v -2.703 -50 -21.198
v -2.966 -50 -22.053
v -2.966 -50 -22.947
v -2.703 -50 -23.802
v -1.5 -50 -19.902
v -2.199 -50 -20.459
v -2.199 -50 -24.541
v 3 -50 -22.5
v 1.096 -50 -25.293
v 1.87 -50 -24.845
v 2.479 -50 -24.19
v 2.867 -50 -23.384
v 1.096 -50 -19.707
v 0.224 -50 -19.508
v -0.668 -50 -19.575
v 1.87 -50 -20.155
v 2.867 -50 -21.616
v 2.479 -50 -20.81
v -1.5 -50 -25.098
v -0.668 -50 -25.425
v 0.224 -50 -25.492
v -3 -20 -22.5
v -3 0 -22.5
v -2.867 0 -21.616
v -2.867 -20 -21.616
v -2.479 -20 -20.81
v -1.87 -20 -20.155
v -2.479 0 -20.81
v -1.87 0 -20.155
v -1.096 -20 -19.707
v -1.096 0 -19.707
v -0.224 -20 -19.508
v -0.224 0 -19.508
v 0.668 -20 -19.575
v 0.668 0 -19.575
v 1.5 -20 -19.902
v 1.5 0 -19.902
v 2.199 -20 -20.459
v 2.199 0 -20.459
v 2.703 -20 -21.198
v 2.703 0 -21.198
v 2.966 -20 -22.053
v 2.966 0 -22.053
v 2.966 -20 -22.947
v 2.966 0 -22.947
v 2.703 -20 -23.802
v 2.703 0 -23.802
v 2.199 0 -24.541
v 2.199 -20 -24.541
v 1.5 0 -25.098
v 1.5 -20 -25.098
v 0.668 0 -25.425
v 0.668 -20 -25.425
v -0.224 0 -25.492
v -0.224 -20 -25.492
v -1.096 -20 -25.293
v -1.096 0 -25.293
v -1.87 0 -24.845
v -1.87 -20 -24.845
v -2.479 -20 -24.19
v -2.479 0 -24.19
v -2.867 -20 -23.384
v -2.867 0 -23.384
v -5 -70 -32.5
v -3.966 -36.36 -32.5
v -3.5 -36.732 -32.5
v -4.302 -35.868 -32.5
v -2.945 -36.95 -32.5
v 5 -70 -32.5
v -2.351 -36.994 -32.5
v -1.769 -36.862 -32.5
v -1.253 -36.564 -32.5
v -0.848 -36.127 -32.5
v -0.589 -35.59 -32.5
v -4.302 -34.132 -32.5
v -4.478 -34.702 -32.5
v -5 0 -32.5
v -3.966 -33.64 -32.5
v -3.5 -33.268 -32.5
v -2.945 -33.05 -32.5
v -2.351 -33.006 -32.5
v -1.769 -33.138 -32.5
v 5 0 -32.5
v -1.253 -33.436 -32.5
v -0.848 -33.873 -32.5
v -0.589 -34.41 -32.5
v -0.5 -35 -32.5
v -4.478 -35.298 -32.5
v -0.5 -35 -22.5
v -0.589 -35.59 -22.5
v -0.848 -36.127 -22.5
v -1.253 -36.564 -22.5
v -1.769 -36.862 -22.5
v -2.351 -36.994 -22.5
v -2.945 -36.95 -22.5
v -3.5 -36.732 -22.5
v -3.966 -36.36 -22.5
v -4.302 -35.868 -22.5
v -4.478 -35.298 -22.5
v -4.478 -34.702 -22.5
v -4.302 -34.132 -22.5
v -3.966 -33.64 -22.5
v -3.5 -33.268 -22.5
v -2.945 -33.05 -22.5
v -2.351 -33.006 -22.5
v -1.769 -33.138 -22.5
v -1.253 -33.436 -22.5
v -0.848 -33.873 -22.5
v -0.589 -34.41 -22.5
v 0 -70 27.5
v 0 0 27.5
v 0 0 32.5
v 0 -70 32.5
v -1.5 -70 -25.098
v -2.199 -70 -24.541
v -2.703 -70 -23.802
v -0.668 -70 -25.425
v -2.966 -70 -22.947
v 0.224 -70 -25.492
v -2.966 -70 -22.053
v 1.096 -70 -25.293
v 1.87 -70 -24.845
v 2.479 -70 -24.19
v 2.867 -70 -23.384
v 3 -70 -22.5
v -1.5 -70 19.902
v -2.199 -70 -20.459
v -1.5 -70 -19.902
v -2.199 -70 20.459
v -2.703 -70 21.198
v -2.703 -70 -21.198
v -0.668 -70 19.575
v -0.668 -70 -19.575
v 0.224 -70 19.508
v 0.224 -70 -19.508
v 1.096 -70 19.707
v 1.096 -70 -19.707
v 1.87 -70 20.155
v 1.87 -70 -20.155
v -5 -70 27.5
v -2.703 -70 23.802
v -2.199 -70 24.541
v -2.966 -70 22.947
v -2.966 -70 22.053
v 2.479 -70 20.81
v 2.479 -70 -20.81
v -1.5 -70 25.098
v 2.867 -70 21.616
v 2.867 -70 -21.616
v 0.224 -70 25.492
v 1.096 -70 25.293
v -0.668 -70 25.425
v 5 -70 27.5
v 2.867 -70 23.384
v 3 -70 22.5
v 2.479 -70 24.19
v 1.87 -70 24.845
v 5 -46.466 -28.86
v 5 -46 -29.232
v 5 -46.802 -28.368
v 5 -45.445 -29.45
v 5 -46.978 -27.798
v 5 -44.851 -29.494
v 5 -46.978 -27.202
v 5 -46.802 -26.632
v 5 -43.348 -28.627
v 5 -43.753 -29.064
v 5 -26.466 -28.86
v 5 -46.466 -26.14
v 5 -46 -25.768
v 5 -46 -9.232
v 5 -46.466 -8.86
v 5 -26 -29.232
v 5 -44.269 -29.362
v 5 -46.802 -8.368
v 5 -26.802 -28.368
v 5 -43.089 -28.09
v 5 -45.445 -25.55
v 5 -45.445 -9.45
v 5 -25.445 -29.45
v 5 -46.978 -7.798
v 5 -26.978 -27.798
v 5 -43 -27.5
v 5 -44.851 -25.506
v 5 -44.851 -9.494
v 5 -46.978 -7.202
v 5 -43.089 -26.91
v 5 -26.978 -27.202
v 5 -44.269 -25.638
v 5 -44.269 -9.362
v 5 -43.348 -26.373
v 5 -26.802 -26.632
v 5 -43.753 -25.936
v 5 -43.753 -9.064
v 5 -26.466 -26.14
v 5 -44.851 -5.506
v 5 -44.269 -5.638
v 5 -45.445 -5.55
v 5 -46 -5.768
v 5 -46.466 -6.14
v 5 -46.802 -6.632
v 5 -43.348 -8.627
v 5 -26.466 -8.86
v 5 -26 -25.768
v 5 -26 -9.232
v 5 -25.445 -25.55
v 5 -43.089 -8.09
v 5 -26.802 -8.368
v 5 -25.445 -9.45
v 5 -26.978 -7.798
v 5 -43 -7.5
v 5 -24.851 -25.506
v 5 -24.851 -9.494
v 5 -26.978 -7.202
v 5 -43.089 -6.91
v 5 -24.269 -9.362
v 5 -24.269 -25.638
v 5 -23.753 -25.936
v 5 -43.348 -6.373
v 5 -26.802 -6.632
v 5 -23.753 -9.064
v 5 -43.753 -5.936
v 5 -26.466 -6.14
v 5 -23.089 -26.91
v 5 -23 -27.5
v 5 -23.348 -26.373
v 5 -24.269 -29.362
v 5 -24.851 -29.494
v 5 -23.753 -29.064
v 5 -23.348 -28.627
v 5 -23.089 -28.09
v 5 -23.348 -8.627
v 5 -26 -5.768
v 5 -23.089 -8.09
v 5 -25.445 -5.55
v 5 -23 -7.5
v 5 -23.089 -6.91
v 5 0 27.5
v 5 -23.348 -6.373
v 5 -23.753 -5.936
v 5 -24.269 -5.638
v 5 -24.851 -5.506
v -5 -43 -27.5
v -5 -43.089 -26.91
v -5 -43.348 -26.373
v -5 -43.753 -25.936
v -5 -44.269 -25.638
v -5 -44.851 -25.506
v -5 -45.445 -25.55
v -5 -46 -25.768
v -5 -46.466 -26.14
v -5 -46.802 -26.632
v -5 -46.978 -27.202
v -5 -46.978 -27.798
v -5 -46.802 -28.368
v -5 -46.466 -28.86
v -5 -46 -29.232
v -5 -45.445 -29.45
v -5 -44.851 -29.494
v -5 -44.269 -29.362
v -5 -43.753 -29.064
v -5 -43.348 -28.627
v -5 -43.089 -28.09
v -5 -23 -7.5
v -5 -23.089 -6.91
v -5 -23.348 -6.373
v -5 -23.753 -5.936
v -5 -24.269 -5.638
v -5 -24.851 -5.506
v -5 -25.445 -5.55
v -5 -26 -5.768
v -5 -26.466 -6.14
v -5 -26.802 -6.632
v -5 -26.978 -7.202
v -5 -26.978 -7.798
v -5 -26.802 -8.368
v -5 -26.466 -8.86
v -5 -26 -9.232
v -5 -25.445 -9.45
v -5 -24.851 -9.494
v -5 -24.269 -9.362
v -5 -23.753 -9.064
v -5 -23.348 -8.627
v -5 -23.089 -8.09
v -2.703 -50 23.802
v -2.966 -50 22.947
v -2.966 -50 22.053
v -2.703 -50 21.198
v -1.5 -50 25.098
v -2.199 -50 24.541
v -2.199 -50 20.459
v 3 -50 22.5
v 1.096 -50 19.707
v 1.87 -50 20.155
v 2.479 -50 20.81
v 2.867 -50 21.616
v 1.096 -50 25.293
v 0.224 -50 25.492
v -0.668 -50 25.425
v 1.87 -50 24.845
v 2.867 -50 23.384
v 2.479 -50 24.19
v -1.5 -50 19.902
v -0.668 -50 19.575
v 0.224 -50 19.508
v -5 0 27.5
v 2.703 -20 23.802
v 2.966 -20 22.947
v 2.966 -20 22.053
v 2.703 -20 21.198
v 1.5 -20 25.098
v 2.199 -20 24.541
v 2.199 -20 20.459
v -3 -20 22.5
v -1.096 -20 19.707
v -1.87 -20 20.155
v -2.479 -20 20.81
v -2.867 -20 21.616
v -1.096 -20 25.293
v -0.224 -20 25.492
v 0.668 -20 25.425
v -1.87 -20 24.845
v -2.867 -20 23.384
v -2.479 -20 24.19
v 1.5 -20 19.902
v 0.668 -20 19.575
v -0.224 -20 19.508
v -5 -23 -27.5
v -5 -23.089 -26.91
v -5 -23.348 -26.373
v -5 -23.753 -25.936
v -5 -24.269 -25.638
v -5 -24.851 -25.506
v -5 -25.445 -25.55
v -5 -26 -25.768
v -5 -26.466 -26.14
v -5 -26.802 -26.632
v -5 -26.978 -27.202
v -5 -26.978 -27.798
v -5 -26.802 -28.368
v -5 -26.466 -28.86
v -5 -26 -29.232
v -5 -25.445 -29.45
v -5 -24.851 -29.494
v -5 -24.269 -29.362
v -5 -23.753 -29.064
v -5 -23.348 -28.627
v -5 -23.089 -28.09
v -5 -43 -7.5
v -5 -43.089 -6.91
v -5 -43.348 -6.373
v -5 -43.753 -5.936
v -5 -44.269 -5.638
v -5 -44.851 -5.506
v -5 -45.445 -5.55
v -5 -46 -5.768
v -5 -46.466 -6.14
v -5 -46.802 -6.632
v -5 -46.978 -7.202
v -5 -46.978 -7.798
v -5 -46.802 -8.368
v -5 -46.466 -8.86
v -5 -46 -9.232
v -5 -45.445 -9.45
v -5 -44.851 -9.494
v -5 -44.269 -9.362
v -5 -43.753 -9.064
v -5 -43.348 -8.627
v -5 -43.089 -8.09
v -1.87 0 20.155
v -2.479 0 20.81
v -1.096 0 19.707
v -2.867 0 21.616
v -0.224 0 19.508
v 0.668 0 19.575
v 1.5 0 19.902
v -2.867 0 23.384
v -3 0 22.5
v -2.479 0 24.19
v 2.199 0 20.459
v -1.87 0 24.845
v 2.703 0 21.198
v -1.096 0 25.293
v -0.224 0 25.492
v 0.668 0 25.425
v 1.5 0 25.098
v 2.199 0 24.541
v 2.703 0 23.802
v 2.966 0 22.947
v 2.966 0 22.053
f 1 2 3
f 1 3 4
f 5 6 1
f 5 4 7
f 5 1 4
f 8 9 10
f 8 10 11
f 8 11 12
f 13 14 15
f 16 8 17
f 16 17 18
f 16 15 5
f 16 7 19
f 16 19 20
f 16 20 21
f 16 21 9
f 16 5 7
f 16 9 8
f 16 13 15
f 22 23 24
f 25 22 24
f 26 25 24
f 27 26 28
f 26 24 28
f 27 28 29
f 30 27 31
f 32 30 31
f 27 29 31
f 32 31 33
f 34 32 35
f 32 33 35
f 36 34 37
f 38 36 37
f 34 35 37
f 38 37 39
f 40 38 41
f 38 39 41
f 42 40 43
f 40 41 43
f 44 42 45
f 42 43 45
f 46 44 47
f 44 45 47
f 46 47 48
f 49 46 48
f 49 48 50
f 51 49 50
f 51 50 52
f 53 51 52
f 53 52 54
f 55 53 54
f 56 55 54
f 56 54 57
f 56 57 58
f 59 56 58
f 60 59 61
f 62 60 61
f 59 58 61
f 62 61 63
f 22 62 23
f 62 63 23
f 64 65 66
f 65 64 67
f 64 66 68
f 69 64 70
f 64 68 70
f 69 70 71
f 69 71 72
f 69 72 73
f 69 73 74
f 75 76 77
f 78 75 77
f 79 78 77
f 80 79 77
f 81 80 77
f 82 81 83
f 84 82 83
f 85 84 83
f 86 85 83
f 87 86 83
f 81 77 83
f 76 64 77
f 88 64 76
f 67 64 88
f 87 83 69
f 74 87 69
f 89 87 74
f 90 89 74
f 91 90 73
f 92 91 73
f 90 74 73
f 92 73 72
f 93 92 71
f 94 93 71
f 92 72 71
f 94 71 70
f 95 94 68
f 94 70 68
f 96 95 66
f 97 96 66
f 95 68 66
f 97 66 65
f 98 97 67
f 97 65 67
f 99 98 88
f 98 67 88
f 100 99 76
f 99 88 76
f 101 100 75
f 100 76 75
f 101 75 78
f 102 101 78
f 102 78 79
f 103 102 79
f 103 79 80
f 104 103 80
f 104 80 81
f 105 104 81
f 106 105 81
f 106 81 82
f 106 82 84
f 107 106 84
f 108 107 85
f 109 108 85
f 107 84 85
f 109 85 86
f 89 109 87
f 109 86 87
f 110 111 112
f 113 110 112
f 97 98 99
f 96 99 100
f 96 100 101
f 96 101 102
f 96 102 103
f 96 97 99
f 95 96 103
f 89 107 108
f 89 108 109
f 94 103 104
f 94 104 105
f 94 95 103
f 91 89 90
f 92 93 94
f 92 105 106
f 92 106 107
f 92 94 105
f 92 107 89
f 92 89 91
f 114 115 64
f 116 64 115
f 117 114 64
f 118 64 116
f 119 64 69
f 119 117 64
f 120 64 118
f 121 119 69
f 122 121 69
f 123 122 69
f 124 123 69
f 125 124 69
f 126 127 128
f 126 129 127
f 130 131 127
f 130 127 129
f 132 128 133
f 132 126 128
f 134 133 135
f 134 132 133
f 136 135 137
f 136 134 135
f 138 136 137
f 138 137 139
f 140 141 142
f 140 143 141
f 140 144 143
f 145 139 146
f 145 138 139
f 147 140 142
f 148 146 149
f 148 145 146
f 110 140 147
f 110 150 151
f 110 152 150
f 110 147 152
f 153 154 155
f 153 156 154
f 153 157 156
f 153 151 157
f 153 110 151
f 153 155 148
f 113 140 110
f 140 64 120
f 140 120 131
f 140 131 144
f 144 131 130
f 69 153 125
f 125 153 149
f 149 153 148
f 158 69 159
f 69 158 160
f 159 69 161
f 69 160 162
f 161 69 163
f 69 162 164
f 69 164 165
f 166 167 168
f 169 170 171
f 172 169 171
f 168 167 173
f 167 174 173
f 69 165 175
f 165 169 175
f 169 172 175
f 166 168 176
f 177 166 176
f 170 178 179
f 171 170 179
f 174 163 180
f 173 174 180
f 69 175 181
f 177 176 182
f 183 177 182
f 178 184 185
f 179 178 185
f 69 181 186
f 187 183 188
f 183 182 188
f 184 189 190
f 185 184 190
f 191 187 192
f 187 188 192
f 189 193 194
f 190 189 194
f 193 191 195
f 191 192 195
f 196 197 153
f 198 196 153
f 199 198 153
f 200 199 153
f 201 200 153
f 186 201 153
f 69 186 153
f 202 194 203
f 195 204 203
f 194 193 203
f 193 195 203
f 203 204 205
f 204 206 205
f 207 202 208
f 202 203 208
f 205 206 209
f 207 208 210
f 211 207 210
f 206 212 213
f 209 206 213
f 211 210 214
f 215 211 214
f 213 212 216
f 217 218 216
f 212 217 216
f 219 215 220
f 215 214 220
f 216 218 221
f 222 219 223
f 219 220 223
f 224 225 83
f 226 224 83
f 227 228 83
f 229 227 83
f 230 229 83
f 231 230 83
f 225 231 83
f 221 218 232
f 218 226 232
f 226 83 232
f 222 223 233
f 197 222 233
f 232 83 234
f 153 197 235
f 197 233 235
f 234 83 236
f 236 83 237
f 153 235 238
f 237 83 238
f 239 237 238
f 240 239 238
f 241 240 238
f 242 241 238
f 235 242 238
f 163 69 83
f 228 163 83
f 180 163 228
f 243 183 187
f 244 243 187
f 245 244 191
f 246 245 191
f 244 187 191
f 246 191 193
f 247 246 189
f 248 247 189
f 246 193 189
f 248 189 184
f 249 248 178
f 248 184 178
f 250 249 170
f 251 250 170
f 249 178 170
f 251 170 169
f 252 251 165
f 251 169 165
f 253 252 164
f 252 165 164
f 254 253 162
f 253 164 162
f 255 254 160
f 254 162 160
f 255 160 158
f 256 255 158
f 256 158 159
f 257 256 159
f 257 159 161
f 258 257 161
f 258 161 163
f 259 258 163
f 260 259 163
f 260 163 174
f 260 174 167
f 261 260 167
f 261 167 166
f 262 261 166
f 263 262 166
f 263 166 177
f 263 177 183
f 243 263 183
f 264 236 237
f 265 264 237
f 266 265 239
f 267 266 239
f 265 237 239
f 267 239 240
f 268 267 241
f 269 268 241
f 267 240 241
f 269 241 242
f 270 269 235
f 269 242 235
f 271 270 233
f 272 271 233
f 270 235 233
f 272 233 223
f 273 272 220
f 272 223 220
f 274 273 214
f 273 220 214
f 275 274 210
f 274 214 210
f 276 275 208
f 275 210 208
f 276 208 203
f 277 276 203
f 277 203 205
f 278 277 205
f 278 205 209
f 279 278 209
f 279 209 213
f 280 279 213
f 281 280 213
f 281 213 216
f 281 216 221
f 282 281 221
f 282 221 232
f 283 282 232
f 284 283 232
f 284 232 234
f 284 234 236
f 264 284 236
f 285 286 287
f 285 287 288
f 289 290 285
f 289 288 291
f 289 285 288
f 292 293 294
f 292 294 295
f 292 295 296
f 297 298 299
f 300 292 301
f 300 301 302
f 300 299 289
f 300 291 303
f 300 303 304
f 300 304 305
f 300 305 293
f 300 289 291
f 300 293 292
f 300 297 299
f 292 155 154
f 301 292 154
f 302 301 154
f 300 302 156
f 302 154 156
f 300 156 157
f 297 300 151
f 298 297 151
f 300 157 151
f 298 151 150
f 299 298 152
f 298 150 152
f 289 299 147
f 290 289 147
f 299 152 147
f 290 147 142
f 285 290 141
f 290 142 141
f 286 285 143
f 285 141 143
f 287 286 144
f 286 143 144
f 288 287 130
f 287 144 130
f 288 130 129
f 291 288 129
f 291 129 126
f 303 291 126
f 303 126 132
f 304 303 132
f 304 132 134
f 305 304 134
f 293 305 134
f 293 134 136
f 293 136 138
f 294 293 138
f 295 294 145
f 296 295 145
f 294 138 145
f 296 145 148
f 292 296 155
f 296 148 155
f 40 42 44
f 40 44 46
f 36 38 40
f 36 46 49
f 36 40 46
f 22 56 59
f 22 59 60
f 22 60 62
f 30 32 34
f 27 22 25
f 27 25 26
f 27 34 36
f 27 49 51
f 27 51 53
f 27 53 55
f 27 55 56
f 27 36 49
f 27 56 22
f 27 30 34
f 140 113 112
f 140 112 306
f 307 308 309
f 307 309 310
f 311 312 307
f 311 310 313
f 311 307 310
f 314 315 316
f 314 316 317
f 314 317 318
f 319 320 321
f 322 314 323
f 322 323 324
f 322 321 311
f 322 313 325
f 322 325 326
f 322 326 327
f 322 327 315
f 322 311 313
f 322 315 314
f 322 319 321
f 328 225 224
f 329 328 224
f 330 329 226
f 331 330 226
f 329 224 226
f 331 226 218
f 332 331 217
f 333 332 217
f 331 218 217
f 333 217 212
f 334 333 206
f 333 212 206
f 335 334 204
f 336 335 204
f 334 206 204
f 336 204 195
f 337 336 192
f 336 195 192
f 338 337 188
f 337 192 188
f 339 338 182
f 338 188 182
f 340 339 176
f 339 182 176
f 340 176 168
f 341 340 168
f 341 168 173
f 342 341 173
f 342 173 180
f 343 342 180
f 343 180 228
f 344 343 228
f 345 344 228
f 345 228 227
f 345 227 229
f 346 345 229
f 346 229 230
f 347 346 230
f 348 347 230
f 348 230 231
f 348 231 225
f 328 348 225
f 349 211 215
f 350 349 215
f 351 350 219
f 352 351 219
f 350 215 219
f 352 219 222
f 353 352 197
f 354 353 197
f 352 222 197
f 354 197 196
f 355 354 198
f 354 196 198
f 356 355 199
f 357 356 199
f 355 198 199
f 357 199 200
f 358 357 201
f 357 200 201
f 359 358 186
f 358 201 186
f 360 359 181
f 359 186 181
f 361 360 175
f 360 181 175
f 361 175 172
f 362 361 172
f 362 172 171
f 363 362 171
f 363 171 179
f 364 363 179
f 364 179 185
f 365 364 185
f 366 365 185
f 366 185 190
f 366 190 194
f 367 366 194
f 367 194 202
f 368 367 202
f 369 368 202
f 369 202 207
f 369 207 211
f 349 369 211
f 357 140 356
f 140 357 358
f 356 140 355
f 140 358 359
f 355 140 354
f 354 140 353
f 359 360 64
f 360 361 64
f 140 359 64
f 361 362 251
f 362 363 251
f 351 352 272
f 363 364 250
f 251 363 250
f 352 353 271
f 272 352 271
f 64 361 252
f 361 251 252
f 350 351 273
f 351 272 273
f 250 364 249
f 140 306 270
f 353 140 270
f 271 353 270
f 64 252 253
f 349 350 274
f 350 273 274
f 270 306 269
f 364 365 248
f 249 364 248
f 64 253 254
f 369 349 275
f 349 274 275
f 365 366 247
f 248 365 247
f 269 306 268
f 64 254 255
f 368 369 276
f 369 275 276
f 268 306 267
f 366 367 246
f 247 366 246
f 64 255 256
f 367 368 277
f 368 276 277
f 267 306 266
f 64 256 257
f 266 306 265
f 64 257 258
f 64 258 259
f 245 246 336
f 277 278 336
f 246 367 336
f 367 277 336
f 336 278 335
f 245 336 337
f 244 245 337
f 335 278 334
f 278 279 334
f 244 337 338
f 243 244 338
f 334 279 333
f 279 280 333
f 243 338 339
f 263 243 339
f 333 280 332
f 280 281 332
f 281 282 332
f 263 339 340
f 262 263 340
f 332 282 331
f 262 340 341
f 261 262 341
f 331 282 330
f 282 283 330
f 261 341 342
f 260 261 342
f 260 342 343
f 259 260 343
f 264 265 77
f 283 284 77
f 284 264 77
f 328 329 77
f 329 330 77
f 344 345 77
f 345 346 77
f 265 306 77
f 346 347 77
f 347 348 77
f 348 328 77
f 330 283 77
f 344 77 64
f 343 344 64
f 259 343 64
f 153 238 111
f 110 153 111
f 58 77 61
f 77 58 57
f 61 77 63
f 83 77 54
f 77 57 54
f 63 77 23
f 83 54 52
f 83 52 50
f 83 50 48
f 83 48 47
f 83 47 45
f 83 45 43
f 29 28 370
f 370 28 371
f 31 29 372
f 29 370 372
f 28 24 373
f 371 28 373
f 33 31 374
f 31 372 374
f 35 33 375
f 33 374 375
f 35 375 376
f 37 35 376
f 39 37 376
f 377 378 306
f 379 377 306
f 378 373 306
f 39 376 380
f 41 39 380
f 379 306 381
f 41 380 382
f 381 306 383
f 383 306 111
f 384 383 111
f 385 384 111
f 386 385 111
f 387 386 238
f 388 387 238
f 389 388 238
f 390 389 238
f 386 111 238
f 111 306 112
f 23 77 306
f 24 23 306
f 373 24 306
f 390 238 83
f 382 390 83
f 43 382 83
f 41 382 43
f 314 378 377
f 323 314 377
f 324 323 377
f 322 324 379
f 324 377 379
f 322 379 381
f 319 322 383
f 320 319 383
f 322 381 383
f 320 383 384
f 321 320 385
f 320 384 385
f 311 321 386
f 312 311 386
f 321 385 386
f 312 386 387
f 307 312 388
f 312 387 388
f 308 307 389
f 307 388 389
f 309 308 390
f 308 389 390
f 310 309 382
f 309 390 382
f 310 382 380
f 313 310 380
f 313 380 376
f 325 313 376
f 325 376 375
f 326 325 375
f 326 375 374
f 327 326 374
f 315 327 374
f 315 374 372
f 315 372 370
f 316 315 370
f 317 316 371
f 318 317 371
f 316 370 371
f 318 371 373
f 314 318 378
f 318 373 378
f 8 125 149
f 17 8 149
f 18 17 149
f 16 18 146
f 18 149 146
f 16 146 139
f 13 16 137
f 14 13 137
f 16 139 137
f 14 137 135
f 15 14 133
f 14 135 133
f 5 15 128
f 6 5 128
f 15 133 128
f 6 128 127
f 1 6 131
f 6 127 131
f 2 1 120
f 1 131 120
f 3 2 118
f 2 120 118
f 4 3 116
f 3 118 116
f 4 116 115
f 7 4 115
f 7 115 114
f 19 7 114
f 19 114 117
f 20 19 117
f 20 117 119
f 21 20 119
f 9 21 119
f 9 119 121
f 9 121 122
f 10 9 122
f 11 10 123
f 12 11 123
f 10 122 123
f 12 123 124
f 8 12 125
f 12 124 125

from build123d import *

# Parameters (mm, degrees)
F1_DEPTH  = 70
F3_R      = 2
F4_DEPTH  = 25
F6_R      = 3
F7_DEPTH  = 20
F8_R      = 3
F9_DEPTH  = 20
F10_R     = 3
F11_DEPTH = 20
F12_R     = 3
F13_DEPTH = 20
F2_R      = 2
F14_DEPTH = 10
F15_DEPTH = 25


with BuildPart() as f1:
    # F0 (on Front) → F1 (new body)
    with BuildSketch(Plane.XZ):
        Polygon((-5, 27.5), (-5, -32.5), (5, -32.5), (5, 27.5), (0, 27.5), (0, 32.5), align=None)
    extrude(amount=F1_DEPTH)

    # F3 (on face) → F4 (cut)
    with BuildSketch(Plane.YZ.offset(5)):
        with Locations((-45, -27.5)):
            Circle(F3_R)
        with Locations((-45, -7.5)):
            Circle(F3_R)
        with Locations((-25, -7.5)):
            Circle(F3_R)
        with Locations((-25, -27.5)):
            Circle(F3_R)
    extrude(amount=-F4_DEPTH, mode=Mode.SUBTRACT)

    # F6 (on face) → F7 (cut)
    with BuildSketch(Plane(origin=(0, 0, 0), x_dir=(-1, 0, 0), z_dir=(0, 1, 0))):
        with Locations((0, -22.5)):
            Circle(F6_R)
    extrude(amount=-F7_DEPTH, mode=Mode.SUBTRACT)

    # F8 (on face) → F9 (cut)
    with BuildSketch(Plane.XZ.offset(70)):
        with Locations((0, 22.5)):
            Circle(F8_R)
    extrude(amount=-F9_DEPTH, mode=Mode.SUBTRACT)

    # F10 (on face) → F11 (cut)
    with BuildSketch(Plane.XZ.offset(70)):
        with Locations((0, -22.5)):
            Circle(F10_R)
    extrude(amount=-F11_DEPTH, mode=Mode.SUBTRACT)

    # F12 (on face) → F13 (cut)
    with BuildSketch(Plane(origin=(0, 0, 0), x_dir=(-1, 0, 0), z_dir=(0, 1, 0))):
        with Locations((0, 22.5)):
            Circle(F12_R)
    extrude(amount=-F13_DEPTH, mode=Mode.SUBTRACT)

    # F2 (on face) → F14 (cut)
    with BuildSketch(Plane(origin=(0, 0, -32.5), x_dir=(1, 0, 0), z_dir=(0, 0, -1))):
        with Locations((-2.5, 35)):
            Circle(F2_R)
    extrude(amount=-F14_DEPTH, mode=Mode.SUBTRACT)

    # F3 (on face) → F15 (cut)
    with BuildSketch(Plane.YZ.offset(5)):
        with Locations((-45, -27.5)):
            Circle(F3_R)
        with Locations((-45, -7.5)):
            Circle(F3_R)
        with Locations((-25, -7.5)):
            Circle(F3_R)
        with Locations((-25, -27.5)):
            Circle(F3_R)
    extrude(amount=-F15_DEPTH, mode=Mode.SUBTRACT)


solid = f1.part
